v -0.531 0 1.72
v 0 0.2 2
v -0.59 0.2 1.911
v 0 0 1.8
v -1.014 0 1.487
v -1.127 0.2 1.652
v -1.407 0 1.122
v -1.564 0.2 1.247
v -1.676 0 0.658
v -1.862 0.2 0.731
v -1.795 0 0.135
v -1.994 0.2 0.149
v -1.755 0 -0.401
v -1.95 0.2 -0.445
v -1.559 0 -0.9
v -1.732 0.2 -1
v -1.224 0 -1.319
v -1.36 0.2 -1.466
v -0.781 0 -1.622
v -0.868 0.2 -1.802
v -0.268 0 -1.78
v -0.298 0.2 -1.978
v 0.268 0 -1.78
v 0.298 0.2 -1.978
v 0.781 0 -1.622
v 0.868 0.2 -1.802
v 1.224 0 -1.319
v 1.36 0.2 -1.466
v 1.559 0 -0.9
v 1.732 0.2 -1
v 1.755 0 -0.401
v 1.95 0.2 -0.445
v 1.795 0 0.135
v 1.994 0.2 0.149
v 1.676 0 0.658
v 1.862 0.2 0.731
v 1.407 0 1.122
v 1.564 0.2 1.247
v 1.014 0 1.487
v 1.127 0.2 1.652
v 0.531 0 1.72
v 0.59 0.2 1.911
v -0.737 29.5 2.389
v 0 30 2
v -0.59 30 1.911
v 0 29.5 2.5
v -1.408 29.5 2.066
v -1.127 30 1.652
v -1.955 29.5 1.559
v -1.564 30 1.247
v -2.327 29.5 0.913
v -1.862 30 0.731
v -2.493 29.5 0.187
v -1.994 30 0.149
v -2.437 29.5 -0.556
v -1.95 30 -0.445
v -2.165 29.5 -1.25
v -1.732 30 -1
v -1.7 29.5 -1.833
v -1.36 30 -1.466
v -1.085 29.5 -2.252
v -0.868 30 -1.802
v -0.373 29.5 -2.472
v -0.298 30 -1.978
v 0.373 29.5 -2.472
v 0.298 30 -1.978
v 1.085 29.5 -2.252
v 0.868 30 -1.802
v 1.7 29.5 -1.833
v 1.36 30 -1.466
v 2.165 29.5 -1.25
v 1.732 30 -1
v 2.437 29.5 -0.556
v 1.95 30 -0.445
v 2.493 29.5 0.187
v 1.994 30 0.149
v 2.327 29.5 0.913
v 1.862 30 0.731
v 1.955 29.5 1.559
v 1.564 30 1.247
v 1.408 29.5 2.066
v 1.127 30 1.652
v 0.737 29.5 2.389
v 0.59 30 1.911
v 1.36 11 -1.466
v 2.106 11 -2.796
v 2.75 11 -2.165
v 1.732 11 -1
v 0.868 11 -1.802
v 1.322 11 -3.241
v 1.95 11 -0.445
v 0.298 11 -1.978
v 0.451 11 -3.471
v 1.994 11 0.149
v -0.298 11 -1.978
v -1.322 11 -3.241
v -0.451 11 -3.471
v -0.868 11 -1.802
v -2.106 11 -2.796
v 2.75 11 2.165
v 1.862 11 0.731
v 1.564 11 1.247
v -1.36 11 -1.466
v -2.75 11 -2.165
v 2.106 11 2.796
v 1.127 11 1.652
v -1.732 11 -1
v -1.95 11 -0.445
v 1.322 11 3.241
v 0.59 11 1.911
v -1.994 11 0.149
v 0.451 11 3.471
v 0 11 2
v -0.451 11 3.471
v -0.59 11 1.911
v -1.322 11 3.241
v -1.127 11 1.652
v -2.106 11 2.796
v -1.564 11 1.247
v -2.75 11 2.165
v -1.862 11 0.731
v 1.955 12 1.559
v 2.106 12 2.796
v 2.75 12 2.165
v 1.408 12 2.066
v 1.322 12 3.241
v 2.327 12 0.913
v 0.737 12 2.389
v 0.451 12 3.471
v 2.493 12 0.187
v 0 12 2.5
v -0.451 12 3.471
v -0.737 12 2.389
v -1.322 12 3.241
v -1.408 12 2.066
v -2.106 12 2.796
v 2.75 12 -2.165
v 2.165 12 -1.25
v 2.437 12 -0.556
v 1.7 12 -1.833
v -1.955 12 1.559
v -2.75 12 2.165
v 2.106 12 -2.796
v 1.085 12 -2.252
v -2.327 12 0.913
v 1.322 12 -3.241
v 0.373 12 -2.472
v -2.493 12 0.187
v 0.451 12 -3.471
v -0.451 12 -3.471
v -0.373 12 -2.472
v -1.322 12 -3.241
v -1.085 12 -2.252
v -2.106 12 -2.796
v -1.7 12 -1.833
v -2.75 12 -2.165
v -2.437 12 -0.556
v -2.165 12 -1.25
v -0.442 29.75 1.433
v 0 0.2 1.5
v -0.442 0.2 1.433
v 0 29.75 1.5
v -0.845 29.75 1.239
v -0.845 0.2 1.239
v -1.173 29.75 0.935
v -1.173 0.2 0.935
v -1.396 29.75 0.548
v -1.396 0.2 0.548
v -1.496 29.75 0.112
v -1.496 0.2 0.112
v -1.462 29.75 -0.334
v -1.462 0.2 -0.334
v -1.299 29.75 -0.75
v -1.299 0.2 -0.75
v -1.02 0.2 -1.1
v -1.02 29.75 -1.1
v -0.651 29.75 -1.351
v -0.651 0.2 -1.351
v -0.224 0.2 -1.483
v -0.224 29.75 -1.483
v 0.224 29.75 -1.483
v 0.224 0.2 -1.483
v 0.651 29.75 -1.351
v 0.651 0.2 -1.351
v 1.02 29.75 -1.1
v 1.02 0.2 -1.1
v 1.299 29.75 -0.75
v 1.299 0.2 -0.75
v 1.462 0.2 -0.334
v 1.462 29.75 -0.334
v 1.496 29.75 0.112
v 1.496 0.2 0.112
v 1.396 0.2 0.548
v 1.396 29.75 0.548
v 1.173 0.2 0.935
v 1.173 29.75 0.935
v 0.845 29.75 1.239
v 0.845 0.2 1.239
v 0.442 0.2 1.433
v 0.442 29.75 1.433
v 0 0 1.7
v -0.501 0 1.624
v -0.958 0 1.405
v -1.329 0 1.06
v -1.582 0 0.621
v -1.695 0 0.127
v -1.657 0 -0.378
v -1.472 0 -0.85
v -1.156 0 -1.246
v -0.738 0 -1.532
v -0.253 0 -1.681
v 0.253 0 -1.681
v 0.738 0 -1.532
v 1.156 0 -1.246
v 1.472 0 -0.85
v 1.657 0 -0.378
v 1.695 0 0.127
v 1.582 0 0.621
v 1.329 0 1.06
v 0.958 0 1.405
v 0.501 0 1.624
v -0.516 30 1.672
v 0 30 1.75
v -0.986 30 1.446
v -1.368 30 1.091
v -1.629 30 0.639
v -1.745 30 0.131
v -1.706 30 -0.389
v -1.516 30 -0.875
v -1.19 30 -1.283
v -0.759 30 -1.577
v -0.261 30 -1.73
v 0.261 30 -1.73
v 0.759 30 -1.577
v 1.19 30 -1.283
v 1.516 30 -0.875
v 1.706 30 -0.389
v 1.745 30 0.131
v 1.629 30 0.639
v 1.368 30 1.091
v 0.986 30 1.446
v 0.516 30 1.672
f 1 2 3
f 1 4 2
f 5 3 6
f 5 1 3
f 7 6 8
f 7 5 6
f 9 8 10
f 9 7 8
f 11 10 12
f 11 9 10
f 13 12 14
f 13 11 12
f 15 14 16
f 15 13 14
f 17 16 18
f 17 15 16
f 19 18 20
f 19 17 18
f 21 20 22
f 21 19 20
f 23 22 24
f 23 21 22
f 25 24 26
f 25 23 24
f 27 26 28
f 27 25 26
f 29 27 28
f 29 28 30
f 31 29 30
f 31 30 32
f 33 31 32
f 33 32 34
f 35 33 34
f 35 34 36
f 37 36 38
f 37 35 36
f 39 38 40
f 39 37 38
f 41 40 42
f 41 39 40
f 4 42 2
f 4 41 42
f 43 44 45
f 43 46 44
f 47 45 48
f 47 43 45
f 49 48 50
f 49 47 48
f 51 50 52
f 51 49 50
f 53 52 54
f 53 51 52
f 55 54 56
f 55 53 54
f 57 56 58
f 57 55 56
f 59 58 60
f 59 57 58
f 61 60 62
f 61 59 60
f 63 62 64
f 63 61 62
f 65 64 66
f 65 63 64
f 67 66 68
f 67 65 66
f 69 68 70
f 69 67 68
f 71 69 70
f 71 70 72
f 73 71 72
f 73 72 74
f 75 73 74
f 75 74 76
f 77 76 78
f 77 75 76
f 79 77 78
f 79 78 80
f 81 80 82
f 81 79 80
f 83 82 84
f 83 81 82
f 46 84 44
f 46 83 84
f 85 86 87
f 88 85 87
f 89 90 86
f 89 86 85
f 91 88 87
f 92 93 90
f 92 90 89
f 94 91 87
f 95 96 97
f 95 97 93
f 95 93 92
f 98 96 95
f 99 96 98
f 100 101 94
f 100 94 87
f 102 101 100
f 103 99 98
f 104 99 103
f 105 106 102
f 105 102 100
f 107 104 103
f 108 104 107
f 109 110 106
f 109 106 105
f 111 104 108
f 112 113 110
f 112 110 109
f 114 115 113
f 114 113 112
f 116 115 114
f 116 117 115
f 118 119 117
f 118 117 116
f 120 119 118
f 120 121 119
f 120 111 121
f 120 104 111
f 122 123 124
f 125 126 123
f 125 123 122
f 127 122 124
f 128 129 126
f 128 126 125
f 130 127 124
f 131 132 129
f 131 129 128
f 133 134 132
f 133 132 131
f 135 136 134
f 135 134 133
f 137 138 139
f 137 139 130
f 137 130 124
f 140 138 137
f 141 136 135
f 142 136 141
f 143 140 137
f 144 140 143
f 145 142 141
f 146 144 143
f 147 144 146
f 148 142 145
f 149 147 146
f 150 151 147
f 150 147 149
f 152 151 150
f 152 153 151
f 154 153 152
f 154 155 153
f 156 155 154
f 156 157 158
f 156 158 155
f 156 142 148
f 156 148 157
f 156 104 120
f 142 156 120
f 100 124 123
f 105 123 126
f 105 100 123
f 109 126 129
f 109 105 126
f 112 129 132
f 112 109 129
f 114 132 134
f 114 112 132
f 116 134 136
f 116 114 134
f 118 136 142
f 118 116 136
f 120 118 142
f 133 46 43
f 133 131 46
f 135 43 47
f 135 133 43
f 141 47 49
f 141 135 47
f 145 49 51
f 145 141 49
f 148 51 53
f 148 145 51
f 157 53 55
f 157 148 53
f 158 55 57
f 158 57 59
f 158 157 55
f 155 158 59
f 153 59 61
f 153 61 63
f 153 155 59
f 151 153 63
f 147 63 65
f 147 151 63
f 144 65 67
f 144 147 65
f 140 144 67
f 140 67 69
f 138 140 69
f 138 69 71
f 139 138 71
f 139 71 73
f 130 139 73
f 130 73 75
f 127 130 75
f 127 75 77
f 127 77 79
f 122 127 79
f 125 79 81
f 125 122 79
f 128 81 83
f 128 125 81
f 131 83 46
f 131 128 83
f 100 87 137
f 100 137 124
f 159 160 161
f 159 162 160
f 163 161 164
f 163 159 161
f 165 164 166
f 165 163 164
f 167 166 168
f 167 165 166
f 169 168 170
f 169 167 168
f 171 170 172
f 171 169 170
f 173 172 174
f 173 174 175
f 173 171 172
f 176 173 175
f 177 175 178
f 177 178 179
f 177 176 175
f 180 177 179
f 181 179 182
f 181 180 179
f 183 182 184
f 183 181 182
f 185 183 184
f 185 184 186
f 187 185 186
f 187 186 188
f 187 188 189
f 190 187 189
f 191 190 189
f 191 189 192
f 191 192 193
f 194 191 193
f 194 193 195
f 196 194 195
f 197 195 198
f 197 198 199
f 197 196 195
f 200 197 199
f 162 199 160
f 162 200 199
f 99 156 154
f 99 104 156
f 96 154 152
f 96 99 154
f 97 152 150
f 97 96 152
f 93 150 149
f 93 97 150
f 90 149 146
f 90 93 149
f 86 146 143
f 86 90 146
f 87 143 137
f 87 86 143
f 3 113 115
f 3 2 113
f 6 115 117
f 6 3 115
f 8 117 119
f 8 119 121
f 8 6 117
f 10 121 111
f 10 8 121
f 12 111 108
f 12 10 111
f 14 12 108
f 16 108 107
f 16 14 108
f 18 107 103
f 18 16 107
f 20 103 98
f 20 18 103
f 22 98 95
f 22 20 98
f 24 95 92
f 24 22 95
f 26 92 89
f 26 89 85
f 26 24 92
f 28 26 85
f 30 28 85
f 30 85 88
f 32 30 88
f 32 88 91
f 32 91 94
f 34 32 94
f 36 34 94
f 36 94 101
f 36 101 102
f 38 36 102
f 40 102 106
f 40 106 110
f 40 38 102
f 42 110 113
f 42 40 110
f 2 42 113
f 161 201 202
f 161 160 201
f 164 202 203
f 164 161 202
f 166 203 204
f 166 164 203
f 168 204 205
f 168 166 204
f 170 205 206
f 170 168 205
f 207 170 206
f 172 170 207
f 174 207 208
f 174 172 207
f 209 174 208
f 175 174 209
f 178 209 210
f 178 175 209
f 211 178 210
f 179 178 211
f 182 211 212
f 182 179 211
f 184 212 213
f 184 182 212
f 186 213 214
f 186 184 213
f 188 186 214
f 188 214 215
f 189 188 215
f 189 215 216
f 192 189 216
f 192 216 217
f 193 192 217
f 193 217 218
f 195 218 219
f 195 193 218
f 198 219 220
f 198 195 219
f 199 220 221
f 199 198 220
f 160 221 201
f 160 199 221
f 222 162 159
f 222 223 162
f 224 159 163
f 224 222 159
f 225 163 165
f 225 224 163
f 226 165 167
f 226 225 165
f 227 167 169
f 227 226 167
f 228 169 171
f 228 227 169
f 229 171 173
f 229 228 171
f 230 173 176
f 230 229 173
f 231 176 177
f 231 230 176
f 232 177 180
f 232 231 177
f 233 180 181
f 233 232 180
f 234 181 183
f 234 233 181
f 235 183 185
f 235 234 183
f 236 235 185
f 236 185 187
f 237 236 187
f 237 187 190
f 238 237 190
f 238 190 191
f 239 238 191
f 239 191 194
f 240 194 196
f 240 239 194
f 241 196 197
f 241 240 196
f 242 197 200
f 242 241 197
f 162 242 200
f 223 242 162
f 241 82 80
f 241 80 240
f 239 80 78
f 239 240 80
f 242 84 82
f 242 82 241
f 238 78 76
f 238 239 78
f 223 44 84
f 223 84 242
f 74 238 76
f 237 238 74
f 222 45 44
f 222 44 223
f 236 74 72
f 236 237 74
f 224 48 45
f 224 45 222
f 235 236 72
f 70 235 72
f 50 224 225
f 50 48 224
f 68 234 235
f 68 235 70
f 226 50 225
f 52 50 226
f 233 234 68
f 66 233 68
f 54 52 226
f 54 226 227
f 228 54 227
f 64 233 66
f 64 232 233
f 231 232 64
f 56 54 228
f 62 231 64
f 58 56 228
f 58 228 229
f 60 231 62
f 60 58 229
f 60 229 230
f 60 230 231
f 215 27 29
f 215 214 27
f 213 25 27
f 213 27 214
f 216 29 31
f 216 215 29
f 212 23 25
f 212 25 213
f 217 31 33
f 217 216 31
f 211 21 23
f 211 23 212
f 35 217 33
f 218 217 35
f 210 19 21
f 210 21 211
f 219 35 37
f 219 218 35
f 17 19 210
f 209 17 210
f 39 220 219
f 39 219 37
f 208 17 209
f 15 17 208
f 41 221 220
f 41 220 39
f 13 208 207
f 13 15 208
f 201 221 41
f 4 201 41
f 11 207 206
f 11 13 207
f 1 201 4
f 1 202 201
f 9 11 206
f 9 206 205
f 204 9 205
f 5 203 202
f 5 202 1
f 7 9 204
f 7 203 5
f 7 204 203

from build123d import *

# Parameters (mm, degrees)
CUT_EXTRUDE1_REACH = 32.406


with BuildPart() as part:
    # Sketch1 → Revolve1 (revolve)
    with BuildSketch(Plane(origin=(0, 0, 0), x_dir=(0, 0, -1), z_dir=(1, 0, 0))):
        Polygon((-1.5, 0.2), (-1.5, 29.75), (-1.75, 30), (-2, 30), (-2.5, 29.5), (-2.5, 12), (-3.5, 12), (-3.5, 11), (-2, 11), (-2, 0.2), (-1.8, 0), (-1.7, 0), align=None)
    revolve(axis=Axis((0, 30, 0), (0, -1, 0)))

    # Sketch2 → Cut-Extrude1 (cut, up to next)
    with BuildSketch(Plane(origin=(0, 0, 0), x_dir=(1, 0, 0), z_dir=(0, 1, 0)), mode=Mode.PRIVATE) as cut_extrude1_sk1:
        with BuildLine():
            Line((-2.75, 2.165063509), (-2.75, -2.165063509))
            ThreePointArc((-2.75, -2.165063509), (-3.5, 0), (-2.75, 2.165063509))
        make_face()
    cut_extrude1_tool1 = extrude(cut_extrude1_sk1.sketch, amount=CUT_EXTRUDE1_REACH, mode=Mode.PRIVATE) & part.part
    # Sketch2 → Cut-Extrude1 (cut, up to next)
    with BuildSketch(Plane(origin=(0, 0, 0), x_dir=(1, 0, 0), z_dir=(0, 1, 0)), mode=Mode.PRIVATE) as cut_extrude1_sk2:
        with BuildLine():
            Line((2.75, 2.165063509), (2.75, -2.165063509))
            ThreePointArc((2.75, -2.165063509), (3.5, 0), (2.75, 2.165063509))
        make_face()
    cut_extrude1_tool2 = extrude(cut_extrude1_sk2.sketch, amount=CUT_EXTRUDE1_REACH, mode=Mode.PRIVATE) & part.part
    add(cut_extrude1_tool1.solids().sort_by_distance((-3.052938, 0, 0))[0], mode=Mode.SUBTRACT)
    add(cut_extrude1_tool2.solids().sort_by_distance((3.052938, 0, 0))[0], mode=Mode.SUBTRACT)


solid = part.part
